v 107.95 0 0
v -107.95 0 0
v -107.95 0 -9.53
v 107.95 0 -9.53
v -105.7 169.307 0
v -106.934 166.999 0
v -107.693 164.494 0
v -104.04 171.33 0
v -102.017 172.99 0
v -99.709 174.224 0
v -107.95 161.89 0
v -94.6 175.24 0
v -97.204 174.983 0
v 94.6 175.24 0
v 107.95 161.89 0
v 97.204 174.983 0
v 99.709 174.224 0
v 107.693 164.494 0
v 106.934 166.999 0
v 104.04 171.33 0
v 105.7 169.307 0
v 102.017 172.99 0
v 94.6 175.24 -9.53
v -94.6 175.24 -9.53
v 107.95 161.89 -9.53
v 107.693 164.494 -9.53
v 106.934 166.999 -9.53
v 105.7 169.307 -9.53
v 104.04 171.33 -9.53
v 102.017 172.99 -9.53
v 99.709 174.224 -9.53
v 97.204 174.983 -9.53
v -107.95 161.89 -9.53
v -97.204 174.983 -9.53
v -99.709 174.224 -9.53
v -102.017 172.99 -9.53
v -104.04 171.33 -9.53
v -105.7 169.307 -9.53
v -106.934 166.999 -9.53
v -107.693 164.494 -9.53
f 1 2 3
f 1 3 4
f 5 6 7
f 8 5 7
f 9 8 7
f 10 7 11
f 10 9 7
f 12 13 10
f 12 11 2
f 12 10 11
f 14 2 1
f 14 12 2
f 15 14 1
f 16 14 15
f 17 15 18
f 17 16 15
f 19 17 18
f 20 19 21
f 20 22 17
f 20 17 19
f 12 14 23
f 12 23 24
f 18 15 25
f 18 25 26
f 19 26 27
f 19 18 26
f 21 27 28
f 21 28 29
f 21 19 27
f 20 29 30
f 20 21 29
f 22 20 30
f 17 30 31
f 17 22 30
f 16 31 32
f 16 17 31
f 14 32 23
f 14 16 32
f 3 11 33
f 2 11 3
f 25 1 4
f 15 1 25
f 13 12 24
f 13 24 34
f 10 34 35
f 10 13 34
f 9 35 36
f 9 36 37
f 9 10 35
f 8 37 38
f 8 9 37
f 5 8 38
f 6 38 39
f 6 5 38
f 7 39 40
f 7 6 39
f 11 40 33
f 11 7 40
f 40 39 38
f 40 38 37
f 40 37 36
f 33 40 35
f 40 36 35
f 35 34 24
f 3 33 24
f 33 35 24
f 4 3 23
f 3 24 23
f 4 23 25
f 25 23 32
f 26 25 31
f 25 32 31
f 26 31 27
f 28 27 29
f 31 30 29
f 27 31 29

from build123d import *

# Parameters (mm, degrees)
FLANGE_BASE1_DEPTH = 9.53


# Sheet-metal steps are written as plain solids
with BuildPart() as part:
    # Esboço1 → Flange-base1 (new body)
    with BuildSketch(Plane.XY):
        with BuildLine():
            Line((-107.95, 0), (107.95, 0))
            Line((107.95, 0), (107.95, 161.89))
            ThreePointArc((107.95, 161.89), (104.039875529, 171.329875529), (94.6, 175.24))
            Line((94.6, 175.24), (-94.6, 175.24))
            ThreePointArc((-94.6, 175.24), (-104.039875529, 171.329875529), (-107.95, 161.89))
            Line((-107.95, 161.89), (-107.95, 0))
        make_face()
    extrude(amount=-FLANGE_BASE1_DEPTH)


solid = part.part
